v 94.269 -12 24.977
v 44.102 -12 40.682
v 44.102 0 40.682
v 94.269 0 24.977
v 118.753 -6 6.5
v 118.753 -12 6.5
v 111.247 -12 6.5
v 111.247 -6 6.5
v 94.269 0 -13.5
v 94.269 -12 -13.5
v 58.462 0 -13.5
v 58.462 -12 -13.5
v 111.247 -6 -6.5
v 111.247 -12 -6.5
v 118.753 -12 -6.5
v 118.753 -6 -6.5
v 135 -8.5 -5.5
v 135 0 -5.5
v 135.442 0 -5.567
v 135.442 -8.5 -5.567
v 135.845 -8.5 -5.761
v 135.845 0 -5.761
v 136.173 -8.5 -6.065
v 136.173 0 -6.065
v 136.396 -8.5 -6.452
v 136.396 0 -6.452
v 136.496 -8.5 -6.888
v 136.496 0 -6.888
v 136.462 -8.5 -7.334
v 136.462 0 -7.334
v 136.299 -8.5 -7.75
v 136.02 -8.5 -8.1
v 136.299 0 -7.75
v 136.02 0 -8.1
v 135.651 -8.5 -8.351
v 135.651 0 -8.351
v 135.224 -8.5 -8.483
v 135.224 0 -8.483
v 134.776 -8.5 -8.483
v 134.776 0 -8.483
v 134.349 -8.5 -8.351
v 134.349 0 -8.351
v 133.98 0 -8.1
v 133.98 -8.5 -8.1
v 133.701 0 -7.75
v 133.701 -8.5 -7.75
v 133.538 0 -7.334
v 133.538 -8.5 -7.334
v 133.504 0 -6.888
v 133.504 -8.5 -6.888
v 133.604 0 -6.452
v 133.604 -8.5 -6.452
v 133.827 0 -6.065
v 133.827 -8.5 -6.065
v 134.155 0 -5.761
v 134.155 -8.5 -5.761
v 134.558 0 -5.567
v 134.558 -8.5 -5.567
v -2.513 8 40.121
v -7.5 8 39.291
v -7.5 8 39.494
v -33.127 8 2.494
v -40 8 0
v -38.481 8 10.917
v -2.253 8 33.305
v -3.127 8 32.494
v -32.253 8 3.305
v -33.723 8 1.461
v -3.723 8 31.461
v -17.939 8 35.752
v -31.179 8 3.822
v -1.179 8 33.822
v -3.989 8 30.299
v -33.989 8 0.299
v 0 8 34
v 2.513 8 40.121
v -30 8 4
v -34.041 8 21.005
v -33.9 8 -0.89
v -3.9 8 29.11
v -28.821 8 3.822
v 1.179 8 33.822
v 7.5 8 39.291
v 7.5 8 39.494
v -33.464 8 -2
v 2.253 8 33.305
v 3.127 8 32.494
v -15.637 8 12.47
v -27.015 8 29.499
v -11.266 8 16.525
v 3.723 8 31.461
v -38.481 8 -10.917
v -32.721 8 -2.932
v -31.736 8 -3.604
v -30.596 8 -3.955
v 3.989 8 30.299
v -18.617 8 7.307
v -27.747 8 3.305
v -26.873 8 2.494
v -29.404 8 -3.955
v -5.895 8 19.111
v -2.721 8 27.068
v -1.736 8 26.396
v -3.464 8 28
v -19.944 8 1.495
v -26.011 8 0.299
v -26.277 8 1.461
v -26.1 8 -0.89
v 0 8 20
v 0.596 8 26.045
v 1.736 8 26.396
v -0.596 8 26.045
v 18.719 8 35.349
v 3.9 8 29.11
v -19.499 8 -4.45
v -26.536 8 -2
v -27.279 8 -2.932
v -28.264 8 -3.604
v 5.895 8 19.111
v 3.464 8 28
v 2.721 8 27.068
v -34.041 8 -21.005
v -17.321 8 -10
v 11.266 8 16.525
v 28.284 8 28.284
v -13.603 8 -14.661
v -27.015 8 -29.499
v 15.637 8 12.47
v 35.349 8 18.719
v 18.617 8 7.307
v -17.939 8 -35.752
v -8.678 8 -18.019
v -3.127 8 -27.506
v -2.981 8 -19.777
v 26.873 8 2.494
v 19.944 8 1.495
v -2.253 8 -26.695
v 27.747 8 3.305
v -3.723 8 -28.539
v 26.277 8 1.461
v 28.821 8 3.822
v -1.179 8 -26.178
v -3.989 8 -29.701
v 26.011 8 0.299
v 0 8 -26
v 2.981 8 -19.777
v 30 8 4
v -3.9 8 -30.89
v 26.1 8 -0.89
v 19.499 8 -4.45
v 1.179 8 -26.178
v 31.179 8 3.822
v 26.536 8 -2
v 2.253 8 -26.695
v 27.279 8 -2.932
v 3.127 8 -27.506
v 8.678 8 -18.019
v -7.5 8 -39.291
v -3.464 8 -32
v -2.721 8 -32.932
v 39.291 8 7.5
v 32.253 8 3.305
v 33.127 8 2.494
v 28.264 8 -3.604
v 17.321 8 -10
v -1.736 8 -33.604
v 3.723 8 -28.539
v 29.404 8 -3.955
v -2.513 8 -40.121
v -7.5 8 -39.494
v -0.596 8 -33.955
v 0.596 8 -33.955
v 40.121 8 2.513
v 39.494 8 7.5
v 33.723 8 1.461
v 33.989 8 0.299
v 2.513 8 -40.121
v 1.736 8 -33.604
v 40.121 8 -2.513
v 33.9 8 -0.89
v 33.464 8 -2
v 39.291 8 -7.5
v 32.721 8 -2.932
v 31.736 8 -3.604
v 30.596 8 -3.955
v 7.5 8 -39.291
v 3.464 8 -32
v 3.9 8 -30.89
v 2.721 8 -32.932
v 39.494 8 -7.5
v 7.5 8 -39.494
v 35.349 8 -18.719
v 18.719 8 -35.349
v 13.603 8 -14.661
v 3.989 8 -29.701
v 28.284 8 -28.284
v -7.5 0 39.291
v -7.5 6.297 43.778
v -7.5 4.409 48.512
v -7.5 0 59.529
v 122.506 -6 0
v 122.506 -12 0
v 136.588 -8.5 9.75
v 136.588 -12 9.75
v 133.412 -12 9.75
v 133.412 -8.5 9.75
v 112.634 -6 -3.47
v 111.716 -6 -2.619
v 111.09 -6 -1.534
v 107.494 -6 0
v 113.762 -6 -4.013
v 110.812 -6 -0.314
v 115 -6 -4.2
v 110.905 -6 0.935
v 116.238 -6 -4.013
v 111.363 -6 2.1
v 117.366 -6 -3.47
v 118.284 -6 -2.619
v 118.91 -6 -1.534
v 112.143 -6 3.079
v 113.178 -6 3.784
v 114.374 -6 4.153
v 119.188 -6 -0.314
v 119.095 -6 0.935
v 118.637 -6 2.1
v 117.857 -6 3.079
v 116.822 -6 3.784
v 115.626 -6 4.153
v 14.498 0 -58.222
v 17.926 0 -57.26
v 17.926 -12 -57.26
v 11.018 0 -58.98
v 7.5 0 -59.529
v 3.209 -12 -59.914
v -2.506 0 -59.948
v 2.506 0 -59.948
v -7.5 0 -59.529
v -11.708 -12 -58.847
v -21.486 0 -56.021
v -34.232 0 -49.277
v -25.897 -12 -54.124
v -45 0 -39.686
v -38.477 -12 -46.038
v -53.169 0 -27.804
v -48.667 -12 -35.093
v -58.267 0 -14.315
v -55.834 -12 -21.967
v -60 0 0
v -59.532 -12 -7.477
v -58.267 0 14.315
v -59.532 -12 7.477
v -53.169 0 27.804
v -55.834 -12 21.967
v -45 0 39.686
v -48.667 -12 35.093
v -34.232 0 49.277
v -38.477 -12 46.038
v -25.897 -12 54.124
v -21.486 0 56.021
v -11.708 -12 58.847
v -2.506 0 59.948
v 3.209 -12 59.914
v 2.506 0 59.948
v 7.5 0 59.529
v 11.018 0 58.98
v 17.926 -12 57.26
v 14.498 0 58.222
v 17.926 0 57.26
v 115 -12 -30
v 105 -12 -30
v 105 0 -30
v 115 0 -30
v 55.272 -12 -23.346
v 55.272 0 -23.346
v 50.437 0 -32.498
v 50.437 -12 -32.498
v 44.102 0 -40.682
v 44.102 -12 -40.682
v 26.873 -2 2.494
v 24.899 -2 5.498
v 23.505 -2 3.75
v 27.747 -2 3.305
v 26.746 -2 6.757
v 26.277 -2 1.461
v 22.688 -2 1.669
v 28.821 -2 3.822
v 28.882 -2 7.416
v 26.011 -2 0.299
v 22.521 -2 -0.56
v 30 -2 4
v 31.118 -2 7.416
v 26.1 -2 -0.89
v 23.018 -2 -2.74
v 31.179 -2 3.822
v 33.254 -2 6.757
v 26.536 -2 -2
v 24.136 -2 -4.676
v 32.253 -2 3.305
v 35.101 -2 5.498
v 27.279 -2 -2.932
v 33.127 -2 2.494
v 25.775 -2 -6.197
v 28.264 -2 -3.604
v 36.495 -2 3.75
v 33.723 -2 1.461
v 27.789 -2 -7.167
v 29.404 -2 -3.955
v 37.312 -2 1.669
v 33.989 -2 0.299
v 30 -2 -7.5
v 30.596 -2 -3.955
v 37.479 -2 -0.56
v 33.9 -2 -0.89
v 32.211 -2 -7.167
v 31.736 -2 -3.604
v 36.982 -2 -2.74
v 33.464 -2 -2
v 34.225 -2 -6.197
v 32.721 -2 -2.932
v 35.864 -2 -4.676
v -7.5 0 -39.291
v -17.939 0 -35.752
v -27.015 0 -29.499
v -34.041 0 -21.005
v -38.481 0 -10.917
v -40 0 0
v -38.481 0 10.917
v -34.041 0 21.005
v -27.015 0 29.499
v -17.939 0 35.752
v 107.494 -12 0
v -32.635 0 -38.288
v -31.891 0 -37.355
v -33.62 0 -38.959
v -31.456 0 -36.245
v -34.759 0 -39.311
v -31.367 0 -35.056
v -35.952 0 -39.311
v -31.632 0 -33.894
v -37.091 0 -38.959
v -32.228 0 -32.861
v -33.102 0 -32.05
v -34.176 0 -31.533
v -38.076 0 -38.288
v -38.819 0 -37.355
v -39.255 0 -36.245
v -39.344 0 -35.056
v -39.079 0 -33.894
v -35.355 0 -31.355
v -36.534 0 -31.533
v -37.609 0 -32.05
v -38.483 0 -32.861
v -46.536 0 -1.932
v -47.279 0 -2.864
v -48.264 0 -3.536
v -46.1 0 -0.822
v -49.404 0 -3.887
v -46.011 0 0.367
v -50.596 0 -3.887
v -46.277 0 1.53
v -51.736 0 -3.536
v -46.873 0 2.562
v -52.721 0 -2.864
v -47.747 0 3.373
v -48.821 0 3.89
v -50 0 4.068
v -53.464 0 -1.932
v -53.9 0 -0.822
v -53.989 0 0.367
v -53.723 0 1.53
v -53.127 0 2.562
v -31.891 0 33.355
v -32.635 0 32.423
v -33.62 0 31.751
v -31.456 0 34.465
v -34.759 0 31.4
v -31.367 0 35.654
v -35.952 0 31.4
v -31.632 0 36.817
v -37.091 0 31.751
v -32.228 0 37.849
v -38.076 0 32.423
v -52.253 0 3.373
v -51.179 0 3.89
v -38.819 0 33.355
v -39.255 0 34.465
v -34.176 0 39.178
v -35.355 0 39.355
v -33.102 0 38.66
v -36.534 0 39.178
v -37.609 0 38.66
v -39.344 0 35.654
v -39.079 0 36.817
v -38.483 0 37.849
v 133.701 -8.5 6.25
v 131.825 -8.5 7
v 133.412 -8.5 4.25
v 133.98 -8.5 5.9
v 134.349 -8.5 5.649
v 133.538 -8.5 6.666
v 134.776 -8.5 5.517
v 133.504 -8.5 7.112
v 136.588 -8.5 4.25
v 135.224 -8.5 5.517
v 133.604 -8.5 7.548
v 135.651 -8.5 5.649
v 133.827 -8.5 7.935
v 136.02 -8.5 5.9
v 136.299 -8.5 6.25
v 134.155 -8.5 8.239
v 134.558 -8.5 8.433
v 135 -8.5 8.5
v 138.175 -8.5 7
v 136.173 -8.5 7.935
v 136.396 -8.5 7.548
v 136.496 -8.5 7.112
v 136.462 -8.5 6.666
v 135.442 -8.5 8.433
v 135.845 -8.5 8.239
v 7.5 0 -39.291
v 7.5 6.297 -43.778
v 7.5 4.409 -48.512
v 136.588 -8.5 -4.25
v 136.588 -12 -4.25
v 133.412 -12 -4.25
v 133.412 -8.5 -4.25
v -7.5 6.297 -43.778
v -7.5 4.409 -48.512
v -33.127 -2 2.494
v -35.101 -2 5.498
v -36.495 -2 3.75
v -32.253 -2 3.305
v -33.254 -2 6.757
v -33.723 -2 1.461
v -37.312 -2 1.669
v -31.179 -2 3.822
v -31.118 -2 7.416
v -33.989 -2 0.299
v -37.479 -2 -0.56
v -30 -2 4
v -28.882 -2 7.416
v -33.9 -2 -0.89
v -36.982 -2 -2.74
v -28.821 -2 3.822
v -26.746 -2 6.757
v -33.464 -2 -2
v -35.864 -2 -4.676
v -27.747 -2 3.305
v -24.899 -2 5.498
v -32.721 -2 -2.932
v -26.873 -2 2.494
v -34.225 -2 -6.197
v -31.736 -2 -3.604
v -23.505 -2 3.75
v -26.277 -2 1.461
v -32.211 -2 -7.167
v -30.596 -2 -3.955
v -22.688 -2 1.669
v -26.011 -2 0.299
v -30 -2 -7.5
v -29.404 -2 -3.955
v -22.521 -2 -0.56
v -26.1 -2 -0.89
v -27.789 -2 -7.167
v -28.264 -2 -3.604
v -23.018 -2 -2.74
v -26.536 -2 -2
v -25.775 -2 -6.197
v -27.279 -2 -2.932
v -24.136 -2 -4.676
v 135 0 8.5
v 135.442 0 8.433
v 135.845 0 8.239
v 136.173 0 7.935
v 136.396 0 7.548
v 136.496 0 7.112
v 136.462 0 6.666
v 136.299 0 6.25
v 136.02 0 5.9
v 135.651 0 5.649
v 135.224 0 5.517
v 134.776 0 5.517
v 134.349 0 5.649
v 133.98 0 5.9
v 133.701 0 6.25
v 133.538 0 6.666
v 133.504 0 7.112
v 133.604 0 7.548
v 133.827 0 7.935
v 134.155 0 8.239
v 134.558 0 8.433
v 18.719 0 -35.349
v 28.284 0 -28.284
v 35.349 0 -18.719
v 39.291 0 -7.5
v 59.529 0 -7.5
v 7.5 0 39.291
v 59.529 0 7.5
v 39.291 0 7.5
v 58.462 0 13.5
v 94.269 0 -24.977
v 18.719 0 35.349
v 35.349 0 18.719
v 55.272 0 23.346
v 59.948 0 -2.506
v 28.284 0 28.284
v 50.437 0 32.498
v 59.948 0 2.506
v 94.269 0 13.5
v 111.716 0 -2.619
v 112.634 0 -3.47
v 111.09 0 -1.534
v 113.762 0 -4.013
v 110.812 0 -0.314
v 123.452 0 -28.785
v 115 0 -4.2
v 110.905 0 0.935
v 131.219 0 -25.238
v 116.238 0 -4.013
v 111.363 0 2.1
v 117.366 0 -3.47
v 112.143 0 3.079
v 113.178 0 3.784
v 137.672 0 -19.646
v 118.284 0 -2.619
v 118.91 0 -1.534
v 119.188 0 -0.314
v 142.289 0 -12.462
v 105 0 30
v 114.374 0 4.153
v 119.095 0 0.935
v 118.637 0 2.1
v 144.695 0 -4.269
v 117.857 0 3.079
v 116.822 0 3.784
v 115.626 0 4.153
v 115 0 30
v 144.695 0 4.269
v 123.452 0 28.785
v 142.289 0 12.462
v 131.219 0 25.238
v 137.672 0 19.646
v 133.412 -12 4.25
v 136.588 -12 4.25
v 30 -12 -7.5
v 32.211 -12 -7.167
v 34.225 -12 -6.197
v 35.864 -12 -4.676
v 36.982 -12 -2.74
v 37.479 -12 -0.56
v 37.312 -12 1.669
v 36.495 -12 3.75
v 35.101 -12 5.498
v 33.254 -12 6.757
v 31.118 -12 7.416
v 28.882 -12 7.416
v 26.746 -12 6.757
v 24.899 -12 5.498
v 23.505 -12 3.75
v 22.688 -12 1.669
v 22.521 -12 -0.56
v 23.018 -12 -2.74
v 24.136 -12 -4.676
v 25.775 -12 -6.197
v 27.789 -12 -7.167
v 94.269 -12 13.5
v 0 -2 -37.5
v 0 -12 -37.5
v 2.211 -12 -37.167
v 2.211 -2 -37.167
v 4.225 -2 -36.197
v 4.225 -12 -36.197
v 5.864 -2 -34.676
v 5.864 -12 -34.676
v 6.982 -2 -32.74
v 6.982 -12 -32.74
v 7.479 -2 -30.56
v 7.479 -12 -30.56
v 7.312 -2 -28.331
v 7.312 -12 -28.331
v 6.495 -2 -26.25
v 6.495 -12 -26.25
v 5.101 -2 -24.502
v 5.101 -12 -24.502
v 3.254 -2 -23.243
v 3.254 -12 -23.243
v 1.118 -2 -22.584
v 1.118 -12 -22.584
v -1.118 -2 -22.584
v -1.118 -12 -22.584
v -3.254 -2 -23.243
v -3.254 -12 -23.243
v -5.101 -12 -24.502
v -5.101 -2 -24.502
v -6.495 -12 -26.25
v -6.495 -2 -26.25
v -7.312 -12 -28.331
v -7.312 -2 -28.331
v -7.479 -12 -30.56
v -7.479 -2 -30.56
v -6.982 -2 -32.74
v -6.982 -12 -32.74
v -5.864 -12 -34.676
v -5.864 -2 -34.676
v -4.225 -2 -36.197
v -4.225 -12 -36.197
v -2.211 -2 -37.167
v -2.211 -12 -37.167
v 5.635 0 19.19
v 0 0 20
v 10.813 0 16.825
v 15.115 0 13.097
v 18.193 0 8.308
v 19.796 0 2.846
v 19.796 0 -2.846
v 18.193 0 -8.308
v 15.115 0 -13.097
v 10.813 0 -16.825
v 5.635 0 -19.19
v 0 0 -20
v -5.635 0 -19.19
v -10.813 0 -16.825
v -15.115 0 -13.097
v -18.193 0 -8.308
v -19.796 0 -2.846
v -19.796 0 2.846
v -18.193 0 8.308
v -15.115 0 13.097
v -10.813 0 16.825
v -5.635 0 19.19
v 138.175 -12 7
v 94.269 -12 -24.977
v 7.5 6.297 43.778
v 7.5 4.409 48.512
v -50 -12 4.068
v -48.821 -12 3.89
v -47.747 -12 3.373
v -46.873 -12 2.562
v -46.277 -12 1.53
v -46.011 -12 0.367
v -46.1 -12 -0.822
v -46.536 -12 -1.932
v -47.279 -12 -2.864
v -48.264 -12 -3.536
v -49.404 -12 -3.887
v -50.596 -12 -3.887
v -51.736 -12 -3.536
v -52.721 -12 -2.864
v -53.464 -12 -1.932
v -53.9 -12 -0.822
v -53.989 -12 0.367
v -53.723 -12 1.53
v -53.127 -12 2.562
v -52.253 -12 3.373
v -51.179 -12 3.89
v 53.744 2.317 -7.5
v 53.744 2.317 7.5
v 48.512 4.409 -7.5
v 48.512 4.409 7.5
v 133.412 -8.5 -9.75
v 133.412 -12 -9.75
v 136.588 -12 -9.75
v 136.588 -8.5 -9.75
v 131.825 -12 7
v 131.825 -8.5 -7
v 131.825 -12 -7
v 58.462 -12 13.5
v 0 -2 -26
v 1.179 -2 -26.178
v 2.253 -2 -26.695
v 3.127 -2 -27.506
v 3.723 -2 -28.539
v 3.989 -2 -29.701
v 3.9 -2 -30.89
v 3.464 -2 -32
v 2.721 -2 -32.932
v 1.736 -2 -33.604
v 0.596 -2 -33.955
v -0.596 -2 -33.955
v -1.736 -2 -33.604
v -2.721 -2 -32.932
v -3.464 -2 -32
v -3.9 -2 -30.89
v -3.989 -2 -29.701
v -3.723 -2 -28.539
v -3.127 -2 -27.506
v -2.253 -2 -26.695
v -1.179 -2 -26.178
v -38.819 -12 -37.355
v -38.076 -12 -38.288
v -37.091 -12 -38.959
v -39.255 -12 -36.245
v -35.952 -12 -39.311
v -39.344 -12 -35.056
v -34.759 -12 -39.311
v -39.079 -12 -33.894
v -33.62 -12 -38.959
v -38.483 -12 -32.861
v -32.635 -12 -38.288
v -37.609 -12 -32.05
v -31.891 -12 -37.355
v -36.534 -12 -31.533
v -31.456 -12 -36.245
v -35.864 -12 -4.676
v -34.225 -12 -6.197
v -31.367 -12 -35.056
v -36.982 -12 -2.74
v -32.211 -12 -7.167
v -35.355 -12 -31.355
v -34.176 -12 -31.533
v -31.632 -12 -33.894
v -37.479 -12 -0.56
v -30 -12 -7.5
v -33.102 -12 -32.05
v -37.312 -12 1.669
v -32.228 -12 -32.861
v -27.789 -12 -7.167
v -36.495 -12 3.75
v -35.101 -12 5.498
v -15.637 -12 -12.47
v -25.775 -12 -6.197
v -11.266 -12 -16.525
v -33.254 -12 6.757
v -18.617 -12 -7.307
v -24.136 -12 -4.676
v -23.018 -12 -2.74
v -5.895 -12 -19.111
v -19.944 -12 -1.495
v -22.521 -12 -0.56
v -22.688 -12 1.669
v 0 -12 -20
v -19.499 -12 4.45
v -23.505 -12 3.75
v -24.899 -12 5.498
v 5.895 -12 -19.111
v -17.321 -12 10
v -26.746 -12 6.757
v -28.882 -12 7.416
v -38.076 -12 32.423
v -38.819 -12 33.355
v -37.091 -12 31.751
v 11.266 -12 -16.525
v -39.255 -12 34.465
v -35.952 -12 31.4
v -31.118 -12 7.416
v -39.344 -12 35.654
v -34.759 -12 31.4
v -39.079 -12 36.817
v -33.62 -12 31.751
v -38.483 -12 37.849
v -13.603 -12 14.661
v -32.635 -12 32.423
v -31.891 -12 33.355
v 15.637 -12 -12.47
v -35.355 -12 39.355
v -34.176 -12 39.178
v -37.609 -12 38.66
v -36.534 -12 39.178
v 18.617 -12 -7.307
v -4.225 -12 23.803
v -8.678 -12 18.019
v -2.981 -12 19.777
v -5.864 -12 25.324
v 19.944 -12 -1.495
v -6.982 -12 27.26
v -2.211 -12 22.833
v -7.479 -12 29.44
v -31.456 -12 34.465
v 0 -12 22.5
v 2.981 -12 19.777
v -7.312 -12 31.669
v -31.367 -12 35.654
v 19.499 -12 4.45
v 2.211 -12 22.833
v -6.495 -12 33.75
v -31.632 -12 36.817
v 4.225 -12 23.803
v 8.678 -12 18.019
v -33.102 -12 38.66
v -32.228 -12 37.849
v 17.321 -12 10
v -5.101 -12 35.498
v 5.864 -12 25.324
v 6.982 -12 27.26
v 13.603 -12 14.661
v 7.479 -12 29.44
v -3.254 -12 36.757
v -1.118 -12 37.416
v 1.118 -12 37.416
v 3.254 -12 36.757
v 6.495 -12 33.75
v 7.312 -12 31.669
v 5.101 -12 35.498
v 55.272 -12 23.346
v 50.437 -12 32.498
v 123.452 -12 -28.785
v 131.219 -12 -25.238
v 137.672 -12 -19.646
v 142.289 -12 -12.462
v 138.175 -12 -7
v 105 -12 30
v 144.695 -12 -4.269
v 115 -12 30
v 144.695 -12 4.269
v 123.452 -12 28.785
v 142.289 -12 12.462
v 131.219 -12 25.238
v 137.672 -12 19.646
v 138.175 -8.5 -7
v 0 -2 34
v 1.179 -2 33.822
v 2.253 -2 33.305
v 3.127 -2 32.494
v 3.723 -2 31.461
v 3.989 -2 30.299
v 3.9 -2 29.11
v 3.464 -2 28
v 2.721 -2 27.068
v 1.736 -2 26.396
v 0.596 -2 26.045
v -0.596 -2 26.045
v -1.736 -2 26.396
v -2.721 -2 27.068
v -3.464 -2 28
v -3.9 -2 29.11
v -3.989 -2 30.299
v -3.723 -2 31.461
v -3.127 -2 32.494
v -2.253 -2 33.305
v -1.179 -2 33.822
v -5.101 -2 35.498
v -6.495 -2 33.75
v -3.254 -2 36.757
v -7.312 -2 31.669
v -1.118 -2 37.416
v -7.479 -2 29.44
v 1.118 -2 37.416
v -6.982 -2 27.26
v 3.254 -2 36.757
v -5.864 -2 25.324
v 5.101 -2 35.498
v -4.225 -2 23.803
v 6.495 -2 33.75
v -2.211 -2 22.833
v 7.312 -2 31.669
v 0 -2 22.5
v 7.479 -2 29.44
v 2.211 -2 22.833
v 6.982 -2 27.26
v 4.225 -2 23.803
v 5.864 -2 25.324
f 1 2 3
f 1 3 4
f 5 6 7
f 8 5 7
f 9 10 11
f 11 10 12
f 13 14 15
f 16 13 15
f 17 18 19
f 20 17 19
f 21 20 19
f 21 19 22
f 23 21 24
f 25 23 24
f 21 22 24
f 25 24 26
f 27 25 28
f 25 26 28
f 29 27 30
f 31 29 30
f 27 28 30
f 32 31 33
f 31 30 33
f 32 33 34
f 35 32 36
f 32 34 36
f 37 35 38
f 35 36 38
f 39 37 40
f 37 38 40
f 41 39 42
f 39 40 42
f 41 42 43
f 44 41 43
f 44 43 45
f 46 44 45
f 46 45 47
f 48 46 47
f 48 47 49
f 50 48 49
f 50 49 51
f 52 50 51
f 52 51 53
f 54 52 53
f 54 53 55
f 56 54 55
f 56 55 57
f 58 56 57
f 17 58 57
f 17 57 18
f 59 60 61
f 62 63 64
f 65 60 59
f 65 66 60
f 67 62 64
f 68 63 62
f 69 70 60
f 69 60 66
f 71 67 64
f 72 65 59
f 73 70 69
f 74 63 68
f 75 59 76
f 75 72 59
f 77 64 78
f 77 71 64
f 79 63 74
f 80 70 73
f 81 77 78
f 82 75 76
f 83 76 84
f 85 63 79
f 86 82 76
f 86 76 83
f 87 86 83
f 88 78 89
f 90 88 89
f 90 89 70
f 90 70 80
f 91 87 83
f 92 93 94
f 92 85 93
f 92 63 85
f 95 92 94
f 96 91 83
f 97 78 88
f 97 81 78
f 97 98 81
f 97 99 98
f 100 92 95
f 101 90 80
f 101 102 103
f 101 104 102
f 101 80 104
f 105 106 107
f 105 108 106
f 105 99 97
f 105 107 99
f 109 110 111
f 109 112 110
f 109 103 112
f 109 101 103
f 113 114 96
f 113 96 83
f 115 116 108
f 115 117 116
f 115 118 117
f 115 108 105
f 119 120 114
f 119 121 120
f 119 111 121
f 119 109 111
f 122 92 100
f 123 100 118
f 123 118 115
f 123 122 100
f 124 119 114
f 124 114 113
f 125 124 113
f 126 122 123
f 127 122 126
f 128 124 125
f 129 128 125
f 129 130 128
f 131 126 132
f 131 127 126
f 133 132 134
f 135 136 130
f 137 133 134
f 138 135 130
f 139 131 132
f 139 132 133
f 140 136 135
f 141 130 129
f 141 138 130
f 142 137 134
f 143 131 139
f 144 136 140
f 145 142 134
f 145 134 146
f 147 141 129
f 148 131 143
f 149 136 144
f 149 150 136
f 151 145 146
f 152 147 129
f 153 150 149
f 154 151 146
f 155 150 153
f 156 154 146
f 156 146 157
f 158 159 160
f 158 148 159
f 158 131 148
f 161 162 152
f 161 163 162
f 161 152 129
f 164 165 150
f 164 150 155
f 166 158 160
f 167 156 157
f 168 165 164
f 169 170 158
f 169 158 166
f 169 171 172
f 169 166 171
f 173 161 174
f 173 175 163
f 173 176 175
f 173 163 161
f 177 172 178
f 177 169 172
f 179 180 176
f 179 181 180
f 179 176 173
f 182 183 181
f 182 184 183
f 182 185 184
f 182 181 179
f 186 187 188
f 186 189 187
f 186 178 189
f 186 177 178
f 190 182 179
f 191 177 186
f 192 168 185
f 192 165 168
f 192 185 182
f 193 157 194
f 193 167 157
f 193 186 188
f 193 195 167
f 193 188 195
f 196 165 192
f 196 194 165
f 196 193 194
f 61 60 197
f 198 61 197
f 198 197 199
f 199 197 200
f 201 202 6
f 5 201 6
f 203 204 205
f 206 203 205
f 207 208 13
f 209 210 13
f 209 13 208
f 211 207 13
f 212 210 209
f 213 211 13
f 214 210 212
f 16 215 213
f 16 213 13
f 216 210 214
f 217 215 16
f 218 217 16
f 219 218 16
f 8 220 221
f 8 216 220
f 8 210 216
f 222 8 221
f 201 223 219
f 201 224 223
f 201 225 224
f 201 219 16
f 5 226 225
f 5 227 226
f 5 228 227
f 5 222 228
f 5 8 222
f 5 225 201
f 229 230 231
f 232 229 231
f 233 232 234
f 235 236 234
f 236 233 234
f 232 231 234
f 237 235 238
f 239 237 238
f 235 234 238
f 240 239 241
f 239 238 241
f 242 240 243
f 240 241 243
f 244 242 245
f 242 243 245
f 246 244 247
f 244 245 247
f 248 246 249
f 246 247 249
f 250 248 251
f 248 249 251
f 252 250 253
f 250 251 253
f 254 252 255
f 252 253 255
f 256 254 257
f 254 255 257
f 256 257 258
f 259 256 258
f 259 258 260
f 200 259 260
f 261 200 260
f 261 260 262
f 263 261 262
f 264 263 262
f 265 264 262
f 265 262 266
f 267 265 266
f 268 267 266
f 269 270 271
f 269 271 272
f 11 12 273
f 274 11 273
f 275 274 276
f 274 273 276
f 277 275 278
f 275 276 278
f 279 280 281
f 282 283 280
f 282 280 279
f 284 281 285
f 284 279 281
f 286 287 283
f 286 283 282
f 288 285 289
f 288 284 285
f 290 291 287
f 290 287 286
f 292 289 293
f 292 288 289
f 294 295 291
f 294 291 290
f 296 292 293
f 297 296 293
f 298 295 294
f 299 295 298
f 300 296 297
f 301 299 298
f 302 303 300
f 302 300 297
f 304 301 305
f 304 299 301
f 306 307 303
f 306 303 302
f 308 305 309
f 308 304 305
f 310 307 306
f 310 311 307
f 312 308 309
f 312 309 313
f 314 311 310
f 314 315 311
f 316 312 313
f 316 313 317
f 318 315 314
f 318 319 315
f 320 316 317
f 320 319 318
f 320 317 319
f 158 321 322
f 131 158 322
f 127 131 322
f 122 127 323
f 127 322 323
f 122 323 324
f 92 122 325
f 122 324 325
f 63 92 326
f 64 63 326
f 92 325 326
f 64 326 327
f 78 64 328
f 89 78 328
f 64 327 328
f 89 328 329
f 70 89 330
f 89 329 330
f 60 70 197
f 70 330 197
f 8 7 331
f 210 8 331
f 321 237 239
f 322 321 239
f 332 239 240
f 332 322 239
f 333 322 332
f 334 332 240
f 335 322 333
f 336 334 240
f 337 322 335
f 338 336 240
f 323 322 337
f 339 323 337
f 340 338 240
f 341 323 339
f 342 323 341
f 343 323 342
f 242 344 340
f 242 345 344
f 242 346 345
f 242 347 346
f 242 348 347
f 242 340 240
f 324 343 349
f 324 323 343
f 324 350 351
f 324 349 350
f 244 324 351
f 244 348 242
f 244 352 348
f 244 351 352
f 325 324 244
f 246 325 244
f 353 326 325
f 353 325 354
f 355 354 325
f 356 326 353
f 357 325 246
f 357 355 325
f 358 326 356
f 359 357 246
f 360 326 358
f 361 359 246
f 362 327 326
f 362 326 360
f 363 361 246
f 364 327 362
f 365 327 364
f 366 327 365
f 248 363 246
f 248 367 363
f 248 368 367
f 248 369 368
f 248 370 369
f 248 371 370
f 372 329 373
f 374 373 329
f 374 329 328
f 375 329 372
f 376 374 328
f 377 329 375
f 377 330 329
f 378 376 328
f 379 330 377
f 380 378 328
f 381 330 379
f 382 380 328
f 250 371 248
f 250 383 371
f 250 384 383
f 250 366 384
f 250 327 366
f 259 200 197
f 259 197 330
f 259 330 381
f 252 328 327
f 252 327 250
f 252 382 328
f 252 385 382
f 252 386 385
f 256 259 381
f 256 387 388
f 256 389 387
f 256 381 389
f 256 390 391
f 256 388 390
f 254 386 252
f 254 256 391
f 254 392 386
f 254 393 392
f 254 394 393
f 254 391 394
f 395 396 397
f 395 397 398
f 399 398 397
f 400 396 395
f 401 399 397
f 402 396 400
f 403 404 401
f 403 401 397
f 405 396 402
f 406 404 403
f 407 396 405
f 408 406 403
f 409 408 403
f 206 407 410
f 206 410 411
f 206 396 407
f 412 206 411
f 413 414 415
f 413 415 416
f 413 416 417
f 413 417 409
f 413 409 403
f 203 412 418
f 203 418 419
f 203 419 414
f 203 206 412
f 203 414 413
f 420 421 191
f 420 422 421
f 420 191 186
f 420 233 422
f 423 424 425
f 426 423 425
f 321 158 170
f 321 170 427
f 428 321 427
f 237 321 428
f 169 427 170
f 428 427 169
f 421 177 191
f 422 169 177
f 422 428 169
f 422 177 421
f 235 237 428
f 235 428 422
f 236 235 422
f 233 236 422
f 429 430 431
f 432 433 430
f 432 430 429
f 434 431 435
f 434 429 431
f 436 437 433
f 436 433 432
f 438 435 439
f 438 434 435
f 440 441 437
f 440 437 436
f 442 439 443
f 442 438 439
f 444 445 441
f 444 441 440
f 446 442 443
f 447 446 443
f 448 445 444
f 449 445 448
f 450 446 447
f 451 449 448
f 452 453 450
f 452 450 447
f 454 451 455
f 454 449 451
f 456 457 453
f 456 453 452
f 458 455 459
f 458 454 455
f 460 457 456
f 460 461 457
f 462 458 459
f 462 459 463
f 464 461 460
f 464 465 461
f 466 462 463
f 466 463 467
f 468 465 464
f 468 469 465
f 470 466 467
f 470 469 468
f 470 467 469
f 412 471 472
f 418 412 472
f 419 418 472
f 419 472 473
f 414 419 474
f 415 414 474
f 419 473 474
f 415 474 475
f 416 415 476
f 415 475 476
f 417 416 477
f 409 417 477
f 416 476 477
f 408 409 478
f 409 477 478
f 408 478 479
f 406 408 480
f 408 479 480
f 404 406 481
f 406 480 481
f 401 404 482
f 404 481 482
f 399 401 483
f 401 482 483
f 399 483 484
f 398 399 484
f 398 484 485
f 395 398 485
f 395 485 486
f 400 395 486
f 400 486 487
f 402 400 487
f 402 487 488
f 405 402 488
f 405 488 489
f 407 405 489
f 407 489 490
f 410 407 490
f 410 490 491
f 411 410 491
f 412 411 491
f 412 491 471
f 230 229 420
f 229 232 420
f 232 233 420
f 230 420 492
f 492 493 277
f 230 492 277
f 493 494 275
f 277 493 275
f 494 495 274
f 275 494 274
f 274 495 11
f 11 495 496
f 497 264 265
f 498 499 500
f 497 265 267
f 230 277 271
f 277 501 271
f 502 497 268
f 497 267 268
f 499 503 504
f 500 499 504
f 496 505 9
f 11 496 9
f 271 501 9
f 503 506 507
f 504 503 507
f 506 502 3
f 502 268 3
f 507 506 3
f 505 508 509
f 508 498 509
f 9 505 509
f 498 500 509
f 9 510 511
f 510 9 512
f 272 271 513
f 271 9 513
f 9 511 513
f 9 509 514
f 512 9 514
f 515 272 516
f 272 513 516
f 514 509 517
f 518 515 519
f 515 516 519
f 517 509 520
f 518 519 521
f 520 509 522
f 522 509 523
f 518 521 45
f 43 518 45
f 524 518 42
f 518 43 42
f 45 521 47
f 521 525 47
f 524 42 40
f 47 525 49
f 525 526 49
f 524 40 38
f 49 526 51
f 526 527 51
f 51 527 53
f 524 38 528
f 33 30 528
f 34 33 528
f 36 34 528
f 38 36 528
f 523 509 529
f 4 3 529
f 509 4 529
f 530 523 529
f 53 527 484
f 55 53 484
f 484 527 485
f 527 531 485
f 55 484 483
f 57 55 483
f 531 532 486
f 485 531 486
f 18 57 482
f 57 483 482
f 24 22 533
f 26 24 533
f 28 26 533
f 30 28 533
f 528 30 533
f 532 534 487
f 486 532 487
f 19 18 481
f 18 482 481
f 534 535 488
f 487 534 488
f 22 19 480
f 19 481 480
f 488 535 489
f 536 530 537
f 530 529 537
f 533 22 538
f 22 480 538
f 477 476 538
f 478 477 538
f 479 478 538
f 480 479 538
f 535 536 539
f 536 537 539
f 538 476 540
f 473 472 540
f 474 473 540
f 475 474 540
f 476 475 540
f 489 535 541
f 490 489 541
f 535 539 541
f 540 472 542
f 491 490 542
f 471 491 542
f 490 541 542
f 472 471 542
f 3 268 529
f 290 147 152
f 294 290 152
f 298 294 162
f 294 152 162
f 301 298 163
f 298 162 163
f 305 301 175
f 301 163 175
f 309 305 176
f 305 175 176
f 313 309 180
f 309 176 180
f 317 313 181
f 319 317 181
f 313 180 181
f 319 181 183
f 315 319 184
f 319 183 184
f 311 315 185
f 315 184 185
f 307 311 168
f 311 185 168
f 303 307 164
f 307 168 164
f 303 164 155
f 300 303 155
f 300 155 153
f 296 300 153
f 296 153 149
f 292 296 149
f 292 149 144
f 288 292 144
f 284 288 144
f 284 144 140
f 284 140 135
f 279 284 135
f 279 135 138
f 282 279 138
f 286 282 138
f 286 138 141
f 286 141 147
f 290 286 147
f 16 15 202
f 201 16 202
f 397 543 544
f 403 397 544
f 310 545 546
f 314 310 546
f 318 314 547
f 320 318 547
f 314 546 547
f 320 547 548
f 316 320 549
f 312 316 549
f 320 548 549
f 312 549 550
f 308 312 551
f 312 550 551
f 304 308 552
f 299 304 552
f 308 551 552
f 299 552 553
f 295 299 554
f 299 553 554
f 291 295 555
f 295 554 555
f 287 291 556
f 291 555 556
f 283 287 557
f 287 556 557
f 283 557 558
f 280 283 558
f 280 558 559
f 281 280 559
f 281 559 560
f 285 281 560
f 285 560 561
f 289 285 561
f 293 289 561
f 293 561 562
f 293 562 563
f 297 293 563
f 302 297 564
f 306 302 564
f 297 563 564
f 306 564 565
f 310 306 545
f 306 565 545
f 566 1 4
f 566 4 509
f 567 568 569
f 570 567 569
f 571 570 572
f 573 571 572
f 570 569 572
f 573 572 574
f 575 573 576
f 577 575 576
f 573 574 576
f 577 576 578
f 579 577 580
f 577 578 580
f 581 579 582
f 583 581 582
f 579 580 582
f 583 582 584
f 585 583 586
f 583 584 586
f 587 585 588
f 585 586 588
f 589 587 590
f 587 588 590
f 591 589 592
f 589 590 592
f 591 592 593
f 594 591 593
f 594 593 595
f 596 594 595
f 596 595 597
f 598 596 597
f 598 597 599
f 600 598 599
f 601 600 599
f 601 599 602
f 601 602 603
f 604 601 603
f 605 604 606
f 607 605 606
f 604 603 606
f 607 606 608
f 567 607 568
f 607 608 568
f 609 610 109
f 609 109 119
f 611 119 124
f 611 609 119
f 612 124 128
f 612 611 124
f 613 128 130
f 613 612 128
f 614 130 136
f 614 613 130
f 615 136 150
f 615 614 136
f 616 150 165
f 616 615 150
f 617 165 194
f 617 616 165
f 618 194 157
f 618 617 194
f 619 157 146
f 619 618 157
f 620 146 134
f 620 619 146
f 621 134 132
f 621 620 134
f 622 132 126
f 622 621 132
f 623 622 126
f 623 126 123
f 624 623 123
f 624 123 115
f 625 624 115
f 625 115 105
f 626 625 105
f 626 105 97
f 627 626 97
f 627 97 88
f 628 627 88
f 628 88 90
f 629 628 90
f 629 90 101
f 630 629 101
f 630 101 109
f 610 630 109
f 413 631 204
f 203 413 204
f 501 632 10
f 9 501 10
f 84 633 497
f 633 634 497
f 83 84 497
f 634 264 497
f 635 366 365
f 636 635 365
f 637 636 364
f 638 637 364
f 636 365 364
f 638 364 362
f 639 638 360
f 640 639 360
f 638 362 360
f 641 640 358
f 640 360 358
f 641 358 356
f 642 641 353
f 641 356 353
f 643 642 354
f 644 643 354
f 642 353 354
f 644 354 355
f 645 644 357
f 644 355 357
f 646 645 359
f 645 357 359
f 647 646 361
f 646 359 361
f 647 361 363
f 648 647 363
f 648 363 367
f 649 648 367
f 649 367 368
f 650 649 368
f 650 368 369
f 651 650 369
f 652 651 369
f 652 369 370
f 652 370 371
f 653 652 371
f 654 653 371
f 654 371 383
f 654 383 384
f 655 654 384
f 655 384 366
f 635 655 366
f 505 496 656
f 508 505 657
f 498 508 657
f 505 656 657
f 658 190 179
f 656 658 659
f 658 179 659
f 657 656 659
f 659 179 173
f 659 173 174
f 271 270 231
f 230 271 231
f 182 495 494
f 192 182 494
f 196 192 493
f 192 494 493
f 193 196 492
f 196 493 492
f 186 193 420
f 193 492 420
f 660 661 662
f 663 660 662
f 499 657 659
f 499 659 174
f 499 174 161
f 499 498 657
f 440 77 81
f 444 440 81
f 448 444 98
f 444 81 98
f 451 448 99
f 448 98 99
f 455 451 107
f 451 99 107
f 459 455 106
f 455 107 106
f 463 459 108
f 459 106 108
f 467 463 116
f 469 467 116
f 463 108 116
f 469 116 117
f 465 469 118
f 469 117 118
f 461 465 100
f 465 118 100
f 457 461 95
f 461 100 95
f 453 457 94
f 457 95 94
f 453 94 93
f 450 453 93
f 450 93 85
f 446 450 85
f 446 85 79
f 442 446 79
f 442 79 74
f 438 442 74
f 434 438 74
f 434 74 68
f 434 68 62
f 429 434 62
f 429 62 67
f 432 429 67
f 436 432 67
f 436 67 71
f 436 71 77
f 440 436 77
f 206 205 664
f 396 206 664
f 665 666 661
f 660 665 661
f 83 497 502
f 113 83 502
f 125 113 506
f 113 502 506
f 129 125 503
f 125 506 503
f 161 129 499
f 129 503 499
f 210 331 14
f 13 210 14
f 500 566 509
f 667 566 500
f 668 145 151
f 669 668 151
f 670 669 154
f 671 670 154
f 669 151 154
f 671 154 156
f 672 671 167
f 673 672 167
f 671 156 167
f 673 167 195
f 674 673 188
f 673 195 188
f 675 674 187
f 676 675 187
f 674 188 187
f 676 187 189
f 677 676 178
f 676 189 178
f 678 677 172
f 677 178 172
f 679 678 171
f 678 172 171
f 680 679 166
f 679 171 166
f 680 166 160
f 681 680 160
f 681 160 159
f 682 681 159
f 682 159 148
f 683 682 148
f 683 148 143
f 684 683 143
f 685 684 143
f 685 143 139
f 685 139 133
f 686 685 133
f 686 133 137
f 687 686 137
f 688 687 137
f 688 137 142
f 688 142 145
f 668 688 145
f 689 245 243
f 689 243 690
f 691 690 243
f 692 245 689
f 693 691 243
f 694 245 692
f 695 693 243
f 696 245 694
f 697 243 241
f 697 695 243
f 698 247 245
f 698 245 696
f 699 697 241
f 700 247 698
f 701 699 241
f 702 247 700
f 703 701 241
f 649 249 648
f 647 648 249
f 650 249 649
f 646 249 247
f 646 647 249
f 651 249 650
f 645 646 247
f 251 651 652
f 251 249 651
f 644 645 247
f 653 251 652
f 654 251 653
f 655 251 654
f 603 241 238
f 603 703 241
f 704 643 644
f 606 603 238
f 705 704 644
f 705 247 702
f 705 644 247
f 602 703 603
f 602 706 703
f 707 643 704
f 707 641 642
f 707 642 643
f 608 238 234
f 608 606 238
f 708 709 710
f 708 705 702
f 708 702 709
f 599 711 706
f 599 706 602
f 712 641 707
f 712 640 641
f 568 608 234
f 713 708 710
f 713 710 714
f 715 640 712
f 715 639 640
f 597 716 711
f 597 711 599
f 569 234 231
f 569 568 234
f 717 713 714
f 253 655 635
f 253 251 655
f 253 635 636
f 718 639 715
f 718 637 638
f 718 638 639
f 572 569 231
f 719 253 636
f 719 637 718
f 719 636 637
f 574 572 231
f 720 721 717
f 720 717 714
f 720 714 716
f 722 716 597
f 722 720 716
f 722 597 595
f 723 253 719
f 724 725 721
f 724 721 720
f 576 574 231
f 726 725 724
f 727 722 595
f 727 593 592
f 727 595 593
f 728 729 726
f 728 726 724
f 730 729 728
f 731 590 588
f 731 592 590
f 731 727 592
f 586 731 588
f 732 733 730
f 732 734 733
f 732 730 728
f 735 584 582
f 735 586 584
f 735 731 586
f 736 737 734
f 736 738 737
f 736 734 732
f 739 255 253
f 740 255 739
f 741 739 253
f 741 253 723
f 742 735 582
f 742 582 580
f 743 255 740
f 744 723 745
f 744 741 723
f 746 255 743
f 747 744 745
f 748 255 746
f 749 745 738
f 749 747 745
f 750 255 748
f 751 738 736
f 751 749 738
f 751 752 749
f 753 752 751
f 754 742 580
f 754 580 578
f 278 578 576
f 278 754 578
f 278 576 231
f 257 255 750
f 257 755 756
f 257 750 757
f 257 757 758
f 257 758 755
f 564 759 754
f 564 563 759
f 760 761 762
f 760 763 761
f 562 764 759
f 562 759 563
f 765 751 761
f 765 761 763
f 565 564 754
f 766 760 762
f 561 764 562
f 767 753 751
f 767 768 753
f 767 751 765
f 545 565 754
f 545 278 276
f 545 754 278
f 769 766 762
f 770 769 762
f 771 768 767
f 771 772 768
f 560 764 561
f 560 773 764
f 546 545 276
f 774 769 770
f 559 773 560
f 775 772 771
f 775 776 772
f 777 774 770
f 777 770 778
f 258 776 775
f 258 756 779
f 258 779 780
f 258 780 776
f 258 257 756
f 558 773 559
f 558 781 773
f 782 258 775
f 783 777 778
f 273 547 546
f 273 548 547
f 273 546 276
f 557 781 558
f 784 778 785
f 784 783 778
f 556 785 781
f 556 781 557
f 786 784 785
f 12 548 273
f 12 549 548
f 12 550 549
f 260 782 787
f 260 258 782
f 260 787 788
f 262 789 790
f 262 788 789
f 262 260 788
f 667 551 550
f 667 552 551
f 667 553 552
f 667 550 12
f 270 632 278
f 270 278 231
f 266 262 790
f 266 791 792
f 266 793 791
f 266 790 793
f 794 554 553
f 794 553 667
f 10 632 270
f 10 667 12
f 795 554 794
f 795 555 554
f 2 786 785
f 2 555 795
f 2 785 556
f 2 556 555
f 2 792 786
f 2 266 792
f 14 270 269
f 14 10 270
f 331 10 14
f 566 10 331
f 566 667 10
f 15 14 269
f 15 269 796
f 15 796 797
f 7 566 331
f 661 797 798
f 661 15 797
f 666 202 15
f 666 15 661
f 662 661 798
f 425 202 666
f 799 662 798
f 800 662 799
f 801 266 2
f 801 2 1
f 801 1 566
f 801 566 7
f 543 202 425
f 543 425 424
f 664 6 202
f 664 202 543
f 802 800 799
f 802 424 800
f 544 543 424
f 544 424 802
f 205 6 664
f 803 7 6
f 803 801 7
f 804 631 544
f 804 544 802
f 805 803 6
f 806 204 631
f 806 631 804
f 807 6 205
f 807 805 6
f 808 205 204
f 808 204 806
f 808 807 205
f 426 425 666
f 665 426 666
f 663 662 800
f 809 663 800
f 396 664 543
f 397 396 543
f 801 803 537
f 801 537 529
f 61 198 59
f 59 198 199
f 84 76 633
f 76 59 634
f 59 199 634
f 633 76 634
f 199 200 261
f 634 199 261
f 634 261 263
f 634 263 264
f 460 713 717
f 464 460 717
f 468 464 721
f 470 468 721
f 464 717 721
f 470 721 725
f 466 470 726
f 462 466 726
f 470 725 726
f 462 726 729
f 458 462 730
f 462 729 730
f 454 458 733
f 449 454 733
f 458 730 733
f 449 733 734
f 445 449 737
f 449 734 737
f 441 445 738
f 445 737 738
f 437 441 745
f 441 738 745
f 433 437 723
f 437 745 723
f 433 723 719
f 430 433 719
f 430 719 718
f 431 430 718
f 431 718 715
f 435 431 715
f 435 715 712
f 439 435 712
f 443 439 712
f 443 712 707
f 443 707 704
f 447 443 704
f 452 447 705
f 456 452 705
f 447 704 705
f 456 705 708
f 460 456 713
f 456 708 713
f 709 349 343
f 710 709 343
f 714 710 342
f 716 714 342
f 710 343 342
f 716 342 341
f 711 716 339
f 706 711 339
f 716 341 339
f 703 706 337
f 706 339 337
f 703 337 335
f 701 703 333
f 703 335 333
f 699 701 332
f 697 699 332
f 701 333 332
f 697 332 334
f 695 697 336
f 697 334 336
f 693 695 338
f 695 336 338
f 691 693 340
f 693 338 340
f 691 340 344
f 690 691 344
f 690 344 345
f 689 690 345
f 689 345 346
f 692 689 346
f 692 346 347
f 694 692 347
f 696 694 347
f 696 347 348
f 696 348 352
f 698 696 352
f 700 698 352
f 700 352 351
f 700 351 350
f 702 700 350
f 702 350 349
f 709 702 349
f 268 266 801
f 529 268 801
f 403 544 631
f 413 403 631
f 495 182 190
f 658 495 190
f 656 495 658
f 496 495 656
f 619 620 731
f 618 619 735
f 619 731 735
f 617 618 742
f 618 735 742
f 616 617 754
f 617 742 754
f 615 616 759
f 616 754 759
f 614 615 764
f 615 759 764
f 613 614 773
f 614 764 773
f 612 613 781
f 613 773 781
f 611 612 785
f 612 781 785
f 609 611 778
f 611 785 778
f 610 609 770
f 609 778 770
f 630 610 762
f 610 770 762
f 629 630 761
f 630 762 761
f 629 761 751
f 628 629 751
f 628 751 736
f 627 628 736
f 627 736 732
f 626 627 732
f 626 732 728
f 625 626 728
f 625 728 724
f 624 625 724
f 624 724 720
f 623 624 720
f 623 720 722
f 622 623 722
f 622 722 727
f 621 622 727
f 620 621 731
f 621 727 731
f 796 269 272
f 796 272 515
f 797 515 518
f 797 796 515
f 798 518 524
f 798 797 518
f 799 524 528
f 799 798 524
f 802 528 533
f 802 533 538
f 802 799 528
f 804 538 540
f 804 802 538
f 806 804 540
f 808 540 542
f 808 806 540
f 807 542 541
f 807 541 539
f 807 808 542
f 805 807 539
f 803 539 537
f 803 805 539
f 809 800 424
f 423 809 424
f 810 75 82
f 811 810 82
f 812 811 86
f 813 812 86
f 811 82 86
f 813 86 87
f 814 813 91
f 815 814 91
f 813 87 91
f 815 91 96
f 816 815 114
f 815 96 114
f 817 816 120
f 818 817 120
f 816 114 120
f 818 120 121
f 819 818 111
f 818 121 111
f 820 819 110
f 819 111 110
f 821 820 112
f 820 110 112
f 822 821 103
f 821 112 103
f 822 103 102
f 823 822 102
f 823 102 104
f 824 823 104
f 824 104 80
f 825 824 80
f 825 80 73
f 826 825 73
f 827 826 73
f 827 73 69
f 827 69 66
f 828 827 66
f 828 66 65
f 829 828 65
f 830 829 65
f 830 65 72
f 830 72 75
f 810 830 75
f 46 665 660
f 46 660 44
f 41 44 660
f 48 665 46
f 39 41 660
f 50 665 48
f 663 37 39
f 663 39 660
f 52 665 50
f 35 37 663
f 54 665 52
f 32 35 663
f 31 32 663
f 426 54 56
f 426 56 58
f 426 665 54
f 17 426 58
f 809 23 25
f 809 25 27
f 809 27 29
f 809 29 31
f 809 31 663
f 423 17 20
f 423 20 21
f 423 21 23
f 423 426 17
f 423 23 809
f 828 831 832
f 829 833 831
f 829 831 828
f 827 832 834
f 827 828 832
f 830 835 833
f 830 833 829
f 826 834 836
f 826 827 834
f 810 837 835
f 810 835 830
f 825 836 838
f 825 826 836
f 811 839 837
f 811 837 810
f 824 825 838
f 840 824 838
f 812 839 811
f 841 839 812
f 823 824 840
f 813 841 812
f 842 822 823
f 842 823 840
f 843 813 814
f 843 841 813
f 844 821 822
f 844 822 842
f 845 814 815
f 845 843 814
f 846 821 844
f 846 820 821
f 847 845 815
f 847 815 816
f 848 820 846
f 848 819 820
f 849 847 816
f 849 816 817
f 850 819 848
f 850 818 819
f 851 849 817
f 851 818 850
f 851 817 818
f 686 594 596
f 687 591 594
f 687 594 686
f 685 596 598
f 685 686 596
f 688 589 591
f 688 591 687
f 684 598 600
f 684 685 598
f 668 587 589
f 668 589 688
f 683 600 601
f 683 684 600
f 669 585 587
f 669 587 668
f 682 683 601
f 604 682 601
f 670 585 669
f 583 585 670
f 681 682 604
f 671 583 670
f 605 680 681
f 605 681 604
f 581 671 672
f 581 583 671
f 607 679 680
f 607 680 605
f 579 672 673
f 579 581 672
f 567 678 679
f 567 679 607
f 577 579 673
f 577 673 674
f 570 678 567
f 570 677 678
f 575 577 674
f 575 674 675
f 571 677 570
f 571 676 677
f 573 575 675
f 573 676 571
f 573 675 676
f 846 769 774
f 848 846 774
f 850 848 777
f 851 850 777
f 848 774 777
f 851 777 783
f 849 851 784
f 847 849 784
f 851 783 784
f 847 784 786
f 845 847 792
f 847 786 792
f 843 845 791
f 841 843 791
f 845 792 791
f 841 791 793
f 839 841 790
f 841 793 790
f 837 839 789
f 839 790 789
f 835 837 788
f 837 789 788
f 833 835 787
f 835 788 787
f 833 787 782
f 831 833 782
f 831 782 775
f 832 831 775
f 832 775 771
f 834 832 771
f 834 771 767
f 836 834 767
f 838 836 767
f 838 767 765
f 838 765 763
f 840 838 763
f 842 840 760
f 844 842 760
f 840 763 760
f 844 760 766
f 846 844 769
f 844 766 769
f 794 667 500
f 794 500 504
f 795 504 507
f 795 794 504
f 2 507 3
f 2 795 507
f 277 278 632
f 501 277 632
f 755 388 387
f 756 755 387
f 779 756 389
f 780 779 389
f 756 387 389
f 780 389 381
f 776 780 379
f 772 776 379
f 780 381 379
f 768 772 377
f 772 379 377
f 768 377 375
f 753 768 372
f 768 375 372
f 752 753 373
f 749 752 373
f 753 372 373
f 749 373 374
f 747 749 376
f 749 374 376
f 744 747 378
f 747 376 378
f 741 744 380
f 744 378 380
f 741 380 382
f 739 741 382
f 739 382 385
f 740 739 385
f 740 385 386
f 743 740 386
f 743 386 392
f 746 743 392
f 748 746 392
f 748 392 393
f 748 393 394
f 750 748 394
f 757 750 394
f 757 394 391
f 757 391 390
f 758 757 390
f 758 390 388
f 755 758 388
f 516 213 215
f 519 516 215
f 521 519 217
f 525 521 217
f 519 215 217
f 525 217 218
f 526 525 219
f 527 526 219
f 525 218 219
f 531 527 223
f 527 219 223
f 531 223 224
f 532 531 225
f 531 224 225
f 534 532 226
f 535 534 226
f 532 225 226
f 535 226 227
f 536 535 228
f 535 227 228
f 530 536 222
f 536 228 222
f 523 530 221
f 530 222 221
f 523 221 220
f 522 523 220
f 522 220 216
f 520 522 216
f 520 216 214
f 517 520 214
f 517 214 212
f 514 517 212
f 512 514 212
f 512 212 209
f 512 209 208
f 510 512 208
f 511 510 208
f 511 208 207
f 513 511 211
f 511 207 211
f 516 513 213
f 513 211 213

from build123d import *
from OCP.BRepFilletAPI import BRepFilletAPI_MakeChamfer
from build123d.topology import SkipClean

# Parameters (mm, degrees)
SKETCH1_R           = 40
SKETCH1_R_2         = 20
BOSS_EXTRUDE1_DEPTH = 8
BOSS_EXTRUDE2_START = 12
SKETCH3_R           = 20
BOSS_EXTRUDE2_DEPTH = 12
SKETCH5_R           = 7.5
CUT_EXTRUDE3_DEPTH  = 10
SKETCH2_R           = 4
CUT_EXTRUDE1_DEPTH  = 20
BOSS_EXTRUDE3_DEPTH = 8
CHAMFER1_SIZE       = 19.800694827
CHAMFER1_SIZE_2     = 8
BOSS_EXTRUDE4_DEPTH = 12
CUT_EXTRUDE4_DEPTH  = 6
SKETCH9_R           = 4.2
CUT_EXTRUDE5_DEPTH  = 6
CUT_EXTRUDE7_START  = -12
CUT_EXTRUDE7_DEPTH  = 12
SKETCH_1_R          = 4
CUT_EXTRUDE_1_DEPTH = 158.381701605
SKETCH_2_R          = 1.5
CUT_EXTRUDE_2_DEPTH = 158.381701605
CUT_EXTRUDE_3_DEPTH = 3.5
SKETCH_1_4_R        = 4
CUT_EXTRUDE_4_DEPTH = 158.381701605


with BuildPart() as part:
    # Sketch1 → Boss-Extrude1 (new body)
    with BuildSketch(Plane(origin=(0, 0, 0), x_dir=(1, 0, 0), z_dir=(0, 1, 0))):
        with Locations(Location((0, 0, 0), (0, 0, 270))):
            Circle(SKETCH1_R)
        with Locations(Location((0, 0, 0), (0, 0, 270))):
            Circle(SKETCH1_R_2, mode=Mode.SUBTRACT)
    extrude(amount=BOSS_EXTRUDE1_DEPTH)

    # Sketch3 → Boss-Extrude2 (add)
    with SkipClean():  # the faces are left unmerged after this step: merging them gives an invalid solid
        with BuildSketch(Plane.XZ.offset(BOSS_EXTRUDE2_START)):
            with BuildLine():
                Line((17.925820686, 57.259627599), (105, 30))
                Line((105, 30), (105, -30))
                Line((105, -30), (17.925820686, -57.259627599))
                ThreePointArc((17.925820686, -57.259627599), (-60, 0), (17.925820686, 57.259627599))
            make_face()
            with Locations(Location((0, 0, 0), (0, 0, 270))):
                Circle(SKETCH3_R, mode=Mode.SUBTRACT)
        extrude(amount=-BOSS_EXTRUDE2_DEPTH)

    # Sketch5 → Cut-Extrude3 (cut)
    with SkipClean():  # the faces are left unmerged after this step: merging them gives an invalid solid
        with BuildSketch(Plane.XZ.offset(12)):
            with Locations(Location((0, 30, 0), (0, 0, 270))):
                Circle(SKETCH5_R)
            with Locations(Location((30, 0, 0), (0, 0, 270))):
                Circle(SKETCH5_R)
            with Locations(Location((0, -30, 0), (0, 0, 270))):
                Circle(SKETCH5_R)
            with Locations(Location((-30, 0, 0), (0, 0, 270))):
                Circle(SKETCH5_R)
        extrude(amount=-CUT_EXTRUDE3_DEPTH, mode=Mode.SUBTRACT)

    # Sketch2 → Cut-Extrude1 (cut)
    with SkipClean():  # the faces are left unmerged after this step: merging them gives an invalid solid
        with BuildSketch(Plane(origin=(0, 8, 0), x_dir=(1, 0, 0), z_dir=(0, 1, 0))):
            with Locations(Location((30, 0, 0), (0, 0, 270))):
                Circle(SKETCH2_R)
            with Locations(Location((0, -30, 0), (0, 0, 270))):
                Circle(SKETCH2_R)
            with Locations(Location((-30, 0, 0), (0, 0, 270))):
                Circle(SKETCH2_R)
            with Locations(Location((0, 30, 0), (0, 0, 270))):
                Circle(SKETCH2_R)
        extrude(amount=-CUT_EXTRUDE1_DEPTH, mode=Mode.SUBTRACT)

    # Sketch6 → Boss-Extrude3 (add)
    with SkipClean():  # the faces are left unmerged after this step: merging them gives an invalid solid
        with BuildSketch(Plane(origin=(0, 0, 0), x_dir=(1, 0, 0), z_dir=(0, 1, 0))):
            with BuildLine():
                Line((-7.5, -39.290584114), (-7.5, -59.529404499))
                ThreePointArc((-7.5, -59.529404499), (0, -60), (7.5, -59.529404499))
                Line((7.5, -59.529404499), (7.5, -39.290584114))
                ThreePointArc((7.5, -39.290584114), (0, -40), (-7.5, -39.290584114))
            make_face()
            with BuildLine():
                Line((-7.5, 39.290584114), (-7.5, 59.529404499))
                ThreePointArc((-7.5, 59.529404499), (0, 60), (7.5, 59.529404499))
                Line((7.5, 59.529404499), (7.5, 39.290584114))
                ThreePointArc((7.5, 39.290584114), (0, 40), (-7.5, 39.290584114))
            make_face()
            with BuildLine():
                Line((39.290584114, 7.5), (59.529404499, 7.5))
                ThreePointArc((59.529404499, 7.5), (60, 0), (59.529404499, -7.5))
                Line((59.529404499, -7.5), (39.290584114, -7.5))
                ThreePointArc((39.290584114, -7.5), (40, 0), (39.290584114, 7.5))
            make_face()
        extrude(amount=BOSS_EXTRUDE3_DEPTH)

    # Chamfer1
    chamfer1_edges_1 = [part.edges().sort_by_distance(p)[0] for p in [
        (0, 8, -60),
    ]]
    chamfer1_side_1 = [part.faces().sort_by_distance(p)[0] for p in [
        (0, 8, -59.84),
    ]]
    chamfer1_edges_2 = [part.edges().sort_by_distance(p)[0] for p in [
        (60, 8, 0),
    ]]
    chamfer1_side_2 = [part.faces().sort_by_distance(p)[0] for p in [
        (60, 7.84, 0),
    ]]
    chamfer1_edges_3 = [part.edges().sort_by_distance(p)[0] for p in [
        (0, 8, 60),
    ]]
    chamfer1_side_3 = [part.faces().sort_by_distance(p)[0] for p in [
        (0, 8, 59.84),
    ]]
    chamfer1 = BRepFilletAPI_MakeChamfer(part.part.solid().wrapped)
    for e in chamfer1_edges_1:
        chamfer1.Add(CHAMFER1_SIZE - 0.0001, CHAMFER1_SIZE_2 - 0.0001, e.wrapped, chamfer1_side_1[0].wrapped)
    for e in chamfer1_edges_2:
        chamfer1.Add(CHAMFER1_SIZE_2 - 0.0001, CHAMFER1_SIZE - 0.0001, e.wrapped, chamfer1_side_2[0].wrapped)
    for e in chamfer1_edges_3:
        chamfer1.Add(CHAMFER1_SIZE - 0.0001, CHAMFER1_SIZE_2 - 0.0001, e.wrapped, chamfer1_side_3[0].wrapped)
    add(Compound.cast(chamfer1.Shape()), mode=Mode.REPLACE)  # a hair under: the kernel refuses the full size

    # Sketch7 → Boss-Extrude4 (add)
    with BuildSketch(Plane.XZ.offset(12)):
        with BuildLine():
            Line((115, 30), (105, 30))
            Line((105, 30), (105, -30))
            Line((105, -30), (115, -30))
            ThreePointArc((115, -30), (145, 0), (115, 30))
        make_face()
    extrude(amount=-BOSS_EXTRUDE4_DEPTH)

    # Sketch8 → Cut-Extrude4 (cut)
    with BuildSketch(Plane.XZ.offset(12)):
        Polygon((111.24722325, -6.5), (118.75277675, -6.5), (122.505553499, 0), (118.75277675, 6.5), (111.24722325, 6.5), (107.494446501, 0), align=None)
    extrude(amount=-CUT_EXTRUDE4_DEPTH, mode=Mode.SUBTRACT)

    # Sketch9 → Cut-Extrude5 (cut)
    with BuildSketch(Plane.XZ.offset(6)):
        with Locations(Location((115, 0, 0), (0, 0, 270))):
            Circle(SKETCH9_R)
    extrude(amount=-CUT_EXTRUDE5_DEPTH, mode=Mode.SUBTRACT)

    # Sketch11 → Cut-Extrude7 (cut)
    with BuildSketch(Plane(origin=(0, 0, 0), x_dir=(1, 0, 0), z_dir=(0, 1, 0)).offset(CUT_EXTRUDE7_START)):
        with BuildLine():
            Line((94.268829829, 24.976653188), (94.268829829, 13.5))
            Line((94.268829829, 13.5), (58.46152581, 13.5))
            ThreePointArc((58.46152581, 13.5), (53.052110577, 28.026301278), (44.101832404, 40.682040001))
            Line((44.101832404, 40.682040001), (94.268829829, 24.976653188))
        make_face()
    cut_extrude7 = extrude(amount=CUT_EXTRUDE7_DEPTH, mode=Mode.SUBTRACT)

    # Mirror1: Cut-Extrude7 across plane
    add(cut_extrude7.mirror(Plane.XY), mode=Mode.SUBTRACT)

    # 草图1 → 切除-拉伸1 (cut, through all)
    with BuildSketch(Plane(origin=(0, 0, 0), x_dir=(1, 0, 0), z_dir=(0, 1, 0))):
        with Locations(Location((-35.355339059, 35.355339059, 0), (0, 0, 270))):
            Circle(SKETCH_1_R)
        with Locations(Location((-35.355339059, -35.355339059, 0), (0, 0, 270))):
            Circle(SKETCH_1_R)
    extrude(amount=-CUT_EXTRUDE_1_DEPTH, mode=Mode.SUBTRACT)

    # 草图2 → 切除-拉伸2 (cut, through all)
    with BuildSketch(Plane(origin=(0, 0, 0), x_dir=(1, 0, 0), z_dir=(0, 1, 0))):
        with Locations(Location((135, -7, 0), (0, 0, 270))):
            Circle(SKETCH_2_R)
        with Locations(Location((135, 7, 0), (0, 0, 270))):
            Circle(SKETCH_2_R)
    extrude(amount=-CUT_EXTRUDE_2_DEPTH, mode=Mode.SUBTRACT)

    # 草图3 → 切除-拉伸3 (cut)
    with BuildSketch(Plane.XZ.offset(12)):
        Polygon((133.41228676, -9.75), (136.58771324, -9.75), (138.175426481, -7), (136.58771324, -4.25), (133.41228676, -4.25), (131.824573519, -7), align=None)
        Polygon((133.41228676, 4.25), (136.58771324, 4.25), (138.175426481, 7), (136.58771324, 9.75), (133.41228676, 9.75), (131.824573519, 7), align=None)
    extrude(amount=-CUT_EXTRUDE_3_DEPTH, mode=Mode.SUBTRACT)

    # 草图1<4> → 切除-拉伸4 (cut, through all)
    with BuildSketch(Plane(origin=(0, 0, 0), x_dir=(1, 0, 0), z_dir=(0, 1, 0))):
        with Locations(Location((-35.355339059, 35.355339059, 0), (0, 0, 270))):
            Circle(SKETCH_1_4_R)
        with Locations(Location((-35.355339059, -35.355339059, 0), (0, 0, 270))):
            Circle(SKETCH_1_4_R)
        with Locations(Location((-50, -0.068188384, 0), (0, 0, 270))):
            Circle(SKETCH_1_4_R)
    extrude(amount=-CUT_EXTRUDE_4_DEPTH, mode=Mode.SUBTRACT)


solid = part.part
